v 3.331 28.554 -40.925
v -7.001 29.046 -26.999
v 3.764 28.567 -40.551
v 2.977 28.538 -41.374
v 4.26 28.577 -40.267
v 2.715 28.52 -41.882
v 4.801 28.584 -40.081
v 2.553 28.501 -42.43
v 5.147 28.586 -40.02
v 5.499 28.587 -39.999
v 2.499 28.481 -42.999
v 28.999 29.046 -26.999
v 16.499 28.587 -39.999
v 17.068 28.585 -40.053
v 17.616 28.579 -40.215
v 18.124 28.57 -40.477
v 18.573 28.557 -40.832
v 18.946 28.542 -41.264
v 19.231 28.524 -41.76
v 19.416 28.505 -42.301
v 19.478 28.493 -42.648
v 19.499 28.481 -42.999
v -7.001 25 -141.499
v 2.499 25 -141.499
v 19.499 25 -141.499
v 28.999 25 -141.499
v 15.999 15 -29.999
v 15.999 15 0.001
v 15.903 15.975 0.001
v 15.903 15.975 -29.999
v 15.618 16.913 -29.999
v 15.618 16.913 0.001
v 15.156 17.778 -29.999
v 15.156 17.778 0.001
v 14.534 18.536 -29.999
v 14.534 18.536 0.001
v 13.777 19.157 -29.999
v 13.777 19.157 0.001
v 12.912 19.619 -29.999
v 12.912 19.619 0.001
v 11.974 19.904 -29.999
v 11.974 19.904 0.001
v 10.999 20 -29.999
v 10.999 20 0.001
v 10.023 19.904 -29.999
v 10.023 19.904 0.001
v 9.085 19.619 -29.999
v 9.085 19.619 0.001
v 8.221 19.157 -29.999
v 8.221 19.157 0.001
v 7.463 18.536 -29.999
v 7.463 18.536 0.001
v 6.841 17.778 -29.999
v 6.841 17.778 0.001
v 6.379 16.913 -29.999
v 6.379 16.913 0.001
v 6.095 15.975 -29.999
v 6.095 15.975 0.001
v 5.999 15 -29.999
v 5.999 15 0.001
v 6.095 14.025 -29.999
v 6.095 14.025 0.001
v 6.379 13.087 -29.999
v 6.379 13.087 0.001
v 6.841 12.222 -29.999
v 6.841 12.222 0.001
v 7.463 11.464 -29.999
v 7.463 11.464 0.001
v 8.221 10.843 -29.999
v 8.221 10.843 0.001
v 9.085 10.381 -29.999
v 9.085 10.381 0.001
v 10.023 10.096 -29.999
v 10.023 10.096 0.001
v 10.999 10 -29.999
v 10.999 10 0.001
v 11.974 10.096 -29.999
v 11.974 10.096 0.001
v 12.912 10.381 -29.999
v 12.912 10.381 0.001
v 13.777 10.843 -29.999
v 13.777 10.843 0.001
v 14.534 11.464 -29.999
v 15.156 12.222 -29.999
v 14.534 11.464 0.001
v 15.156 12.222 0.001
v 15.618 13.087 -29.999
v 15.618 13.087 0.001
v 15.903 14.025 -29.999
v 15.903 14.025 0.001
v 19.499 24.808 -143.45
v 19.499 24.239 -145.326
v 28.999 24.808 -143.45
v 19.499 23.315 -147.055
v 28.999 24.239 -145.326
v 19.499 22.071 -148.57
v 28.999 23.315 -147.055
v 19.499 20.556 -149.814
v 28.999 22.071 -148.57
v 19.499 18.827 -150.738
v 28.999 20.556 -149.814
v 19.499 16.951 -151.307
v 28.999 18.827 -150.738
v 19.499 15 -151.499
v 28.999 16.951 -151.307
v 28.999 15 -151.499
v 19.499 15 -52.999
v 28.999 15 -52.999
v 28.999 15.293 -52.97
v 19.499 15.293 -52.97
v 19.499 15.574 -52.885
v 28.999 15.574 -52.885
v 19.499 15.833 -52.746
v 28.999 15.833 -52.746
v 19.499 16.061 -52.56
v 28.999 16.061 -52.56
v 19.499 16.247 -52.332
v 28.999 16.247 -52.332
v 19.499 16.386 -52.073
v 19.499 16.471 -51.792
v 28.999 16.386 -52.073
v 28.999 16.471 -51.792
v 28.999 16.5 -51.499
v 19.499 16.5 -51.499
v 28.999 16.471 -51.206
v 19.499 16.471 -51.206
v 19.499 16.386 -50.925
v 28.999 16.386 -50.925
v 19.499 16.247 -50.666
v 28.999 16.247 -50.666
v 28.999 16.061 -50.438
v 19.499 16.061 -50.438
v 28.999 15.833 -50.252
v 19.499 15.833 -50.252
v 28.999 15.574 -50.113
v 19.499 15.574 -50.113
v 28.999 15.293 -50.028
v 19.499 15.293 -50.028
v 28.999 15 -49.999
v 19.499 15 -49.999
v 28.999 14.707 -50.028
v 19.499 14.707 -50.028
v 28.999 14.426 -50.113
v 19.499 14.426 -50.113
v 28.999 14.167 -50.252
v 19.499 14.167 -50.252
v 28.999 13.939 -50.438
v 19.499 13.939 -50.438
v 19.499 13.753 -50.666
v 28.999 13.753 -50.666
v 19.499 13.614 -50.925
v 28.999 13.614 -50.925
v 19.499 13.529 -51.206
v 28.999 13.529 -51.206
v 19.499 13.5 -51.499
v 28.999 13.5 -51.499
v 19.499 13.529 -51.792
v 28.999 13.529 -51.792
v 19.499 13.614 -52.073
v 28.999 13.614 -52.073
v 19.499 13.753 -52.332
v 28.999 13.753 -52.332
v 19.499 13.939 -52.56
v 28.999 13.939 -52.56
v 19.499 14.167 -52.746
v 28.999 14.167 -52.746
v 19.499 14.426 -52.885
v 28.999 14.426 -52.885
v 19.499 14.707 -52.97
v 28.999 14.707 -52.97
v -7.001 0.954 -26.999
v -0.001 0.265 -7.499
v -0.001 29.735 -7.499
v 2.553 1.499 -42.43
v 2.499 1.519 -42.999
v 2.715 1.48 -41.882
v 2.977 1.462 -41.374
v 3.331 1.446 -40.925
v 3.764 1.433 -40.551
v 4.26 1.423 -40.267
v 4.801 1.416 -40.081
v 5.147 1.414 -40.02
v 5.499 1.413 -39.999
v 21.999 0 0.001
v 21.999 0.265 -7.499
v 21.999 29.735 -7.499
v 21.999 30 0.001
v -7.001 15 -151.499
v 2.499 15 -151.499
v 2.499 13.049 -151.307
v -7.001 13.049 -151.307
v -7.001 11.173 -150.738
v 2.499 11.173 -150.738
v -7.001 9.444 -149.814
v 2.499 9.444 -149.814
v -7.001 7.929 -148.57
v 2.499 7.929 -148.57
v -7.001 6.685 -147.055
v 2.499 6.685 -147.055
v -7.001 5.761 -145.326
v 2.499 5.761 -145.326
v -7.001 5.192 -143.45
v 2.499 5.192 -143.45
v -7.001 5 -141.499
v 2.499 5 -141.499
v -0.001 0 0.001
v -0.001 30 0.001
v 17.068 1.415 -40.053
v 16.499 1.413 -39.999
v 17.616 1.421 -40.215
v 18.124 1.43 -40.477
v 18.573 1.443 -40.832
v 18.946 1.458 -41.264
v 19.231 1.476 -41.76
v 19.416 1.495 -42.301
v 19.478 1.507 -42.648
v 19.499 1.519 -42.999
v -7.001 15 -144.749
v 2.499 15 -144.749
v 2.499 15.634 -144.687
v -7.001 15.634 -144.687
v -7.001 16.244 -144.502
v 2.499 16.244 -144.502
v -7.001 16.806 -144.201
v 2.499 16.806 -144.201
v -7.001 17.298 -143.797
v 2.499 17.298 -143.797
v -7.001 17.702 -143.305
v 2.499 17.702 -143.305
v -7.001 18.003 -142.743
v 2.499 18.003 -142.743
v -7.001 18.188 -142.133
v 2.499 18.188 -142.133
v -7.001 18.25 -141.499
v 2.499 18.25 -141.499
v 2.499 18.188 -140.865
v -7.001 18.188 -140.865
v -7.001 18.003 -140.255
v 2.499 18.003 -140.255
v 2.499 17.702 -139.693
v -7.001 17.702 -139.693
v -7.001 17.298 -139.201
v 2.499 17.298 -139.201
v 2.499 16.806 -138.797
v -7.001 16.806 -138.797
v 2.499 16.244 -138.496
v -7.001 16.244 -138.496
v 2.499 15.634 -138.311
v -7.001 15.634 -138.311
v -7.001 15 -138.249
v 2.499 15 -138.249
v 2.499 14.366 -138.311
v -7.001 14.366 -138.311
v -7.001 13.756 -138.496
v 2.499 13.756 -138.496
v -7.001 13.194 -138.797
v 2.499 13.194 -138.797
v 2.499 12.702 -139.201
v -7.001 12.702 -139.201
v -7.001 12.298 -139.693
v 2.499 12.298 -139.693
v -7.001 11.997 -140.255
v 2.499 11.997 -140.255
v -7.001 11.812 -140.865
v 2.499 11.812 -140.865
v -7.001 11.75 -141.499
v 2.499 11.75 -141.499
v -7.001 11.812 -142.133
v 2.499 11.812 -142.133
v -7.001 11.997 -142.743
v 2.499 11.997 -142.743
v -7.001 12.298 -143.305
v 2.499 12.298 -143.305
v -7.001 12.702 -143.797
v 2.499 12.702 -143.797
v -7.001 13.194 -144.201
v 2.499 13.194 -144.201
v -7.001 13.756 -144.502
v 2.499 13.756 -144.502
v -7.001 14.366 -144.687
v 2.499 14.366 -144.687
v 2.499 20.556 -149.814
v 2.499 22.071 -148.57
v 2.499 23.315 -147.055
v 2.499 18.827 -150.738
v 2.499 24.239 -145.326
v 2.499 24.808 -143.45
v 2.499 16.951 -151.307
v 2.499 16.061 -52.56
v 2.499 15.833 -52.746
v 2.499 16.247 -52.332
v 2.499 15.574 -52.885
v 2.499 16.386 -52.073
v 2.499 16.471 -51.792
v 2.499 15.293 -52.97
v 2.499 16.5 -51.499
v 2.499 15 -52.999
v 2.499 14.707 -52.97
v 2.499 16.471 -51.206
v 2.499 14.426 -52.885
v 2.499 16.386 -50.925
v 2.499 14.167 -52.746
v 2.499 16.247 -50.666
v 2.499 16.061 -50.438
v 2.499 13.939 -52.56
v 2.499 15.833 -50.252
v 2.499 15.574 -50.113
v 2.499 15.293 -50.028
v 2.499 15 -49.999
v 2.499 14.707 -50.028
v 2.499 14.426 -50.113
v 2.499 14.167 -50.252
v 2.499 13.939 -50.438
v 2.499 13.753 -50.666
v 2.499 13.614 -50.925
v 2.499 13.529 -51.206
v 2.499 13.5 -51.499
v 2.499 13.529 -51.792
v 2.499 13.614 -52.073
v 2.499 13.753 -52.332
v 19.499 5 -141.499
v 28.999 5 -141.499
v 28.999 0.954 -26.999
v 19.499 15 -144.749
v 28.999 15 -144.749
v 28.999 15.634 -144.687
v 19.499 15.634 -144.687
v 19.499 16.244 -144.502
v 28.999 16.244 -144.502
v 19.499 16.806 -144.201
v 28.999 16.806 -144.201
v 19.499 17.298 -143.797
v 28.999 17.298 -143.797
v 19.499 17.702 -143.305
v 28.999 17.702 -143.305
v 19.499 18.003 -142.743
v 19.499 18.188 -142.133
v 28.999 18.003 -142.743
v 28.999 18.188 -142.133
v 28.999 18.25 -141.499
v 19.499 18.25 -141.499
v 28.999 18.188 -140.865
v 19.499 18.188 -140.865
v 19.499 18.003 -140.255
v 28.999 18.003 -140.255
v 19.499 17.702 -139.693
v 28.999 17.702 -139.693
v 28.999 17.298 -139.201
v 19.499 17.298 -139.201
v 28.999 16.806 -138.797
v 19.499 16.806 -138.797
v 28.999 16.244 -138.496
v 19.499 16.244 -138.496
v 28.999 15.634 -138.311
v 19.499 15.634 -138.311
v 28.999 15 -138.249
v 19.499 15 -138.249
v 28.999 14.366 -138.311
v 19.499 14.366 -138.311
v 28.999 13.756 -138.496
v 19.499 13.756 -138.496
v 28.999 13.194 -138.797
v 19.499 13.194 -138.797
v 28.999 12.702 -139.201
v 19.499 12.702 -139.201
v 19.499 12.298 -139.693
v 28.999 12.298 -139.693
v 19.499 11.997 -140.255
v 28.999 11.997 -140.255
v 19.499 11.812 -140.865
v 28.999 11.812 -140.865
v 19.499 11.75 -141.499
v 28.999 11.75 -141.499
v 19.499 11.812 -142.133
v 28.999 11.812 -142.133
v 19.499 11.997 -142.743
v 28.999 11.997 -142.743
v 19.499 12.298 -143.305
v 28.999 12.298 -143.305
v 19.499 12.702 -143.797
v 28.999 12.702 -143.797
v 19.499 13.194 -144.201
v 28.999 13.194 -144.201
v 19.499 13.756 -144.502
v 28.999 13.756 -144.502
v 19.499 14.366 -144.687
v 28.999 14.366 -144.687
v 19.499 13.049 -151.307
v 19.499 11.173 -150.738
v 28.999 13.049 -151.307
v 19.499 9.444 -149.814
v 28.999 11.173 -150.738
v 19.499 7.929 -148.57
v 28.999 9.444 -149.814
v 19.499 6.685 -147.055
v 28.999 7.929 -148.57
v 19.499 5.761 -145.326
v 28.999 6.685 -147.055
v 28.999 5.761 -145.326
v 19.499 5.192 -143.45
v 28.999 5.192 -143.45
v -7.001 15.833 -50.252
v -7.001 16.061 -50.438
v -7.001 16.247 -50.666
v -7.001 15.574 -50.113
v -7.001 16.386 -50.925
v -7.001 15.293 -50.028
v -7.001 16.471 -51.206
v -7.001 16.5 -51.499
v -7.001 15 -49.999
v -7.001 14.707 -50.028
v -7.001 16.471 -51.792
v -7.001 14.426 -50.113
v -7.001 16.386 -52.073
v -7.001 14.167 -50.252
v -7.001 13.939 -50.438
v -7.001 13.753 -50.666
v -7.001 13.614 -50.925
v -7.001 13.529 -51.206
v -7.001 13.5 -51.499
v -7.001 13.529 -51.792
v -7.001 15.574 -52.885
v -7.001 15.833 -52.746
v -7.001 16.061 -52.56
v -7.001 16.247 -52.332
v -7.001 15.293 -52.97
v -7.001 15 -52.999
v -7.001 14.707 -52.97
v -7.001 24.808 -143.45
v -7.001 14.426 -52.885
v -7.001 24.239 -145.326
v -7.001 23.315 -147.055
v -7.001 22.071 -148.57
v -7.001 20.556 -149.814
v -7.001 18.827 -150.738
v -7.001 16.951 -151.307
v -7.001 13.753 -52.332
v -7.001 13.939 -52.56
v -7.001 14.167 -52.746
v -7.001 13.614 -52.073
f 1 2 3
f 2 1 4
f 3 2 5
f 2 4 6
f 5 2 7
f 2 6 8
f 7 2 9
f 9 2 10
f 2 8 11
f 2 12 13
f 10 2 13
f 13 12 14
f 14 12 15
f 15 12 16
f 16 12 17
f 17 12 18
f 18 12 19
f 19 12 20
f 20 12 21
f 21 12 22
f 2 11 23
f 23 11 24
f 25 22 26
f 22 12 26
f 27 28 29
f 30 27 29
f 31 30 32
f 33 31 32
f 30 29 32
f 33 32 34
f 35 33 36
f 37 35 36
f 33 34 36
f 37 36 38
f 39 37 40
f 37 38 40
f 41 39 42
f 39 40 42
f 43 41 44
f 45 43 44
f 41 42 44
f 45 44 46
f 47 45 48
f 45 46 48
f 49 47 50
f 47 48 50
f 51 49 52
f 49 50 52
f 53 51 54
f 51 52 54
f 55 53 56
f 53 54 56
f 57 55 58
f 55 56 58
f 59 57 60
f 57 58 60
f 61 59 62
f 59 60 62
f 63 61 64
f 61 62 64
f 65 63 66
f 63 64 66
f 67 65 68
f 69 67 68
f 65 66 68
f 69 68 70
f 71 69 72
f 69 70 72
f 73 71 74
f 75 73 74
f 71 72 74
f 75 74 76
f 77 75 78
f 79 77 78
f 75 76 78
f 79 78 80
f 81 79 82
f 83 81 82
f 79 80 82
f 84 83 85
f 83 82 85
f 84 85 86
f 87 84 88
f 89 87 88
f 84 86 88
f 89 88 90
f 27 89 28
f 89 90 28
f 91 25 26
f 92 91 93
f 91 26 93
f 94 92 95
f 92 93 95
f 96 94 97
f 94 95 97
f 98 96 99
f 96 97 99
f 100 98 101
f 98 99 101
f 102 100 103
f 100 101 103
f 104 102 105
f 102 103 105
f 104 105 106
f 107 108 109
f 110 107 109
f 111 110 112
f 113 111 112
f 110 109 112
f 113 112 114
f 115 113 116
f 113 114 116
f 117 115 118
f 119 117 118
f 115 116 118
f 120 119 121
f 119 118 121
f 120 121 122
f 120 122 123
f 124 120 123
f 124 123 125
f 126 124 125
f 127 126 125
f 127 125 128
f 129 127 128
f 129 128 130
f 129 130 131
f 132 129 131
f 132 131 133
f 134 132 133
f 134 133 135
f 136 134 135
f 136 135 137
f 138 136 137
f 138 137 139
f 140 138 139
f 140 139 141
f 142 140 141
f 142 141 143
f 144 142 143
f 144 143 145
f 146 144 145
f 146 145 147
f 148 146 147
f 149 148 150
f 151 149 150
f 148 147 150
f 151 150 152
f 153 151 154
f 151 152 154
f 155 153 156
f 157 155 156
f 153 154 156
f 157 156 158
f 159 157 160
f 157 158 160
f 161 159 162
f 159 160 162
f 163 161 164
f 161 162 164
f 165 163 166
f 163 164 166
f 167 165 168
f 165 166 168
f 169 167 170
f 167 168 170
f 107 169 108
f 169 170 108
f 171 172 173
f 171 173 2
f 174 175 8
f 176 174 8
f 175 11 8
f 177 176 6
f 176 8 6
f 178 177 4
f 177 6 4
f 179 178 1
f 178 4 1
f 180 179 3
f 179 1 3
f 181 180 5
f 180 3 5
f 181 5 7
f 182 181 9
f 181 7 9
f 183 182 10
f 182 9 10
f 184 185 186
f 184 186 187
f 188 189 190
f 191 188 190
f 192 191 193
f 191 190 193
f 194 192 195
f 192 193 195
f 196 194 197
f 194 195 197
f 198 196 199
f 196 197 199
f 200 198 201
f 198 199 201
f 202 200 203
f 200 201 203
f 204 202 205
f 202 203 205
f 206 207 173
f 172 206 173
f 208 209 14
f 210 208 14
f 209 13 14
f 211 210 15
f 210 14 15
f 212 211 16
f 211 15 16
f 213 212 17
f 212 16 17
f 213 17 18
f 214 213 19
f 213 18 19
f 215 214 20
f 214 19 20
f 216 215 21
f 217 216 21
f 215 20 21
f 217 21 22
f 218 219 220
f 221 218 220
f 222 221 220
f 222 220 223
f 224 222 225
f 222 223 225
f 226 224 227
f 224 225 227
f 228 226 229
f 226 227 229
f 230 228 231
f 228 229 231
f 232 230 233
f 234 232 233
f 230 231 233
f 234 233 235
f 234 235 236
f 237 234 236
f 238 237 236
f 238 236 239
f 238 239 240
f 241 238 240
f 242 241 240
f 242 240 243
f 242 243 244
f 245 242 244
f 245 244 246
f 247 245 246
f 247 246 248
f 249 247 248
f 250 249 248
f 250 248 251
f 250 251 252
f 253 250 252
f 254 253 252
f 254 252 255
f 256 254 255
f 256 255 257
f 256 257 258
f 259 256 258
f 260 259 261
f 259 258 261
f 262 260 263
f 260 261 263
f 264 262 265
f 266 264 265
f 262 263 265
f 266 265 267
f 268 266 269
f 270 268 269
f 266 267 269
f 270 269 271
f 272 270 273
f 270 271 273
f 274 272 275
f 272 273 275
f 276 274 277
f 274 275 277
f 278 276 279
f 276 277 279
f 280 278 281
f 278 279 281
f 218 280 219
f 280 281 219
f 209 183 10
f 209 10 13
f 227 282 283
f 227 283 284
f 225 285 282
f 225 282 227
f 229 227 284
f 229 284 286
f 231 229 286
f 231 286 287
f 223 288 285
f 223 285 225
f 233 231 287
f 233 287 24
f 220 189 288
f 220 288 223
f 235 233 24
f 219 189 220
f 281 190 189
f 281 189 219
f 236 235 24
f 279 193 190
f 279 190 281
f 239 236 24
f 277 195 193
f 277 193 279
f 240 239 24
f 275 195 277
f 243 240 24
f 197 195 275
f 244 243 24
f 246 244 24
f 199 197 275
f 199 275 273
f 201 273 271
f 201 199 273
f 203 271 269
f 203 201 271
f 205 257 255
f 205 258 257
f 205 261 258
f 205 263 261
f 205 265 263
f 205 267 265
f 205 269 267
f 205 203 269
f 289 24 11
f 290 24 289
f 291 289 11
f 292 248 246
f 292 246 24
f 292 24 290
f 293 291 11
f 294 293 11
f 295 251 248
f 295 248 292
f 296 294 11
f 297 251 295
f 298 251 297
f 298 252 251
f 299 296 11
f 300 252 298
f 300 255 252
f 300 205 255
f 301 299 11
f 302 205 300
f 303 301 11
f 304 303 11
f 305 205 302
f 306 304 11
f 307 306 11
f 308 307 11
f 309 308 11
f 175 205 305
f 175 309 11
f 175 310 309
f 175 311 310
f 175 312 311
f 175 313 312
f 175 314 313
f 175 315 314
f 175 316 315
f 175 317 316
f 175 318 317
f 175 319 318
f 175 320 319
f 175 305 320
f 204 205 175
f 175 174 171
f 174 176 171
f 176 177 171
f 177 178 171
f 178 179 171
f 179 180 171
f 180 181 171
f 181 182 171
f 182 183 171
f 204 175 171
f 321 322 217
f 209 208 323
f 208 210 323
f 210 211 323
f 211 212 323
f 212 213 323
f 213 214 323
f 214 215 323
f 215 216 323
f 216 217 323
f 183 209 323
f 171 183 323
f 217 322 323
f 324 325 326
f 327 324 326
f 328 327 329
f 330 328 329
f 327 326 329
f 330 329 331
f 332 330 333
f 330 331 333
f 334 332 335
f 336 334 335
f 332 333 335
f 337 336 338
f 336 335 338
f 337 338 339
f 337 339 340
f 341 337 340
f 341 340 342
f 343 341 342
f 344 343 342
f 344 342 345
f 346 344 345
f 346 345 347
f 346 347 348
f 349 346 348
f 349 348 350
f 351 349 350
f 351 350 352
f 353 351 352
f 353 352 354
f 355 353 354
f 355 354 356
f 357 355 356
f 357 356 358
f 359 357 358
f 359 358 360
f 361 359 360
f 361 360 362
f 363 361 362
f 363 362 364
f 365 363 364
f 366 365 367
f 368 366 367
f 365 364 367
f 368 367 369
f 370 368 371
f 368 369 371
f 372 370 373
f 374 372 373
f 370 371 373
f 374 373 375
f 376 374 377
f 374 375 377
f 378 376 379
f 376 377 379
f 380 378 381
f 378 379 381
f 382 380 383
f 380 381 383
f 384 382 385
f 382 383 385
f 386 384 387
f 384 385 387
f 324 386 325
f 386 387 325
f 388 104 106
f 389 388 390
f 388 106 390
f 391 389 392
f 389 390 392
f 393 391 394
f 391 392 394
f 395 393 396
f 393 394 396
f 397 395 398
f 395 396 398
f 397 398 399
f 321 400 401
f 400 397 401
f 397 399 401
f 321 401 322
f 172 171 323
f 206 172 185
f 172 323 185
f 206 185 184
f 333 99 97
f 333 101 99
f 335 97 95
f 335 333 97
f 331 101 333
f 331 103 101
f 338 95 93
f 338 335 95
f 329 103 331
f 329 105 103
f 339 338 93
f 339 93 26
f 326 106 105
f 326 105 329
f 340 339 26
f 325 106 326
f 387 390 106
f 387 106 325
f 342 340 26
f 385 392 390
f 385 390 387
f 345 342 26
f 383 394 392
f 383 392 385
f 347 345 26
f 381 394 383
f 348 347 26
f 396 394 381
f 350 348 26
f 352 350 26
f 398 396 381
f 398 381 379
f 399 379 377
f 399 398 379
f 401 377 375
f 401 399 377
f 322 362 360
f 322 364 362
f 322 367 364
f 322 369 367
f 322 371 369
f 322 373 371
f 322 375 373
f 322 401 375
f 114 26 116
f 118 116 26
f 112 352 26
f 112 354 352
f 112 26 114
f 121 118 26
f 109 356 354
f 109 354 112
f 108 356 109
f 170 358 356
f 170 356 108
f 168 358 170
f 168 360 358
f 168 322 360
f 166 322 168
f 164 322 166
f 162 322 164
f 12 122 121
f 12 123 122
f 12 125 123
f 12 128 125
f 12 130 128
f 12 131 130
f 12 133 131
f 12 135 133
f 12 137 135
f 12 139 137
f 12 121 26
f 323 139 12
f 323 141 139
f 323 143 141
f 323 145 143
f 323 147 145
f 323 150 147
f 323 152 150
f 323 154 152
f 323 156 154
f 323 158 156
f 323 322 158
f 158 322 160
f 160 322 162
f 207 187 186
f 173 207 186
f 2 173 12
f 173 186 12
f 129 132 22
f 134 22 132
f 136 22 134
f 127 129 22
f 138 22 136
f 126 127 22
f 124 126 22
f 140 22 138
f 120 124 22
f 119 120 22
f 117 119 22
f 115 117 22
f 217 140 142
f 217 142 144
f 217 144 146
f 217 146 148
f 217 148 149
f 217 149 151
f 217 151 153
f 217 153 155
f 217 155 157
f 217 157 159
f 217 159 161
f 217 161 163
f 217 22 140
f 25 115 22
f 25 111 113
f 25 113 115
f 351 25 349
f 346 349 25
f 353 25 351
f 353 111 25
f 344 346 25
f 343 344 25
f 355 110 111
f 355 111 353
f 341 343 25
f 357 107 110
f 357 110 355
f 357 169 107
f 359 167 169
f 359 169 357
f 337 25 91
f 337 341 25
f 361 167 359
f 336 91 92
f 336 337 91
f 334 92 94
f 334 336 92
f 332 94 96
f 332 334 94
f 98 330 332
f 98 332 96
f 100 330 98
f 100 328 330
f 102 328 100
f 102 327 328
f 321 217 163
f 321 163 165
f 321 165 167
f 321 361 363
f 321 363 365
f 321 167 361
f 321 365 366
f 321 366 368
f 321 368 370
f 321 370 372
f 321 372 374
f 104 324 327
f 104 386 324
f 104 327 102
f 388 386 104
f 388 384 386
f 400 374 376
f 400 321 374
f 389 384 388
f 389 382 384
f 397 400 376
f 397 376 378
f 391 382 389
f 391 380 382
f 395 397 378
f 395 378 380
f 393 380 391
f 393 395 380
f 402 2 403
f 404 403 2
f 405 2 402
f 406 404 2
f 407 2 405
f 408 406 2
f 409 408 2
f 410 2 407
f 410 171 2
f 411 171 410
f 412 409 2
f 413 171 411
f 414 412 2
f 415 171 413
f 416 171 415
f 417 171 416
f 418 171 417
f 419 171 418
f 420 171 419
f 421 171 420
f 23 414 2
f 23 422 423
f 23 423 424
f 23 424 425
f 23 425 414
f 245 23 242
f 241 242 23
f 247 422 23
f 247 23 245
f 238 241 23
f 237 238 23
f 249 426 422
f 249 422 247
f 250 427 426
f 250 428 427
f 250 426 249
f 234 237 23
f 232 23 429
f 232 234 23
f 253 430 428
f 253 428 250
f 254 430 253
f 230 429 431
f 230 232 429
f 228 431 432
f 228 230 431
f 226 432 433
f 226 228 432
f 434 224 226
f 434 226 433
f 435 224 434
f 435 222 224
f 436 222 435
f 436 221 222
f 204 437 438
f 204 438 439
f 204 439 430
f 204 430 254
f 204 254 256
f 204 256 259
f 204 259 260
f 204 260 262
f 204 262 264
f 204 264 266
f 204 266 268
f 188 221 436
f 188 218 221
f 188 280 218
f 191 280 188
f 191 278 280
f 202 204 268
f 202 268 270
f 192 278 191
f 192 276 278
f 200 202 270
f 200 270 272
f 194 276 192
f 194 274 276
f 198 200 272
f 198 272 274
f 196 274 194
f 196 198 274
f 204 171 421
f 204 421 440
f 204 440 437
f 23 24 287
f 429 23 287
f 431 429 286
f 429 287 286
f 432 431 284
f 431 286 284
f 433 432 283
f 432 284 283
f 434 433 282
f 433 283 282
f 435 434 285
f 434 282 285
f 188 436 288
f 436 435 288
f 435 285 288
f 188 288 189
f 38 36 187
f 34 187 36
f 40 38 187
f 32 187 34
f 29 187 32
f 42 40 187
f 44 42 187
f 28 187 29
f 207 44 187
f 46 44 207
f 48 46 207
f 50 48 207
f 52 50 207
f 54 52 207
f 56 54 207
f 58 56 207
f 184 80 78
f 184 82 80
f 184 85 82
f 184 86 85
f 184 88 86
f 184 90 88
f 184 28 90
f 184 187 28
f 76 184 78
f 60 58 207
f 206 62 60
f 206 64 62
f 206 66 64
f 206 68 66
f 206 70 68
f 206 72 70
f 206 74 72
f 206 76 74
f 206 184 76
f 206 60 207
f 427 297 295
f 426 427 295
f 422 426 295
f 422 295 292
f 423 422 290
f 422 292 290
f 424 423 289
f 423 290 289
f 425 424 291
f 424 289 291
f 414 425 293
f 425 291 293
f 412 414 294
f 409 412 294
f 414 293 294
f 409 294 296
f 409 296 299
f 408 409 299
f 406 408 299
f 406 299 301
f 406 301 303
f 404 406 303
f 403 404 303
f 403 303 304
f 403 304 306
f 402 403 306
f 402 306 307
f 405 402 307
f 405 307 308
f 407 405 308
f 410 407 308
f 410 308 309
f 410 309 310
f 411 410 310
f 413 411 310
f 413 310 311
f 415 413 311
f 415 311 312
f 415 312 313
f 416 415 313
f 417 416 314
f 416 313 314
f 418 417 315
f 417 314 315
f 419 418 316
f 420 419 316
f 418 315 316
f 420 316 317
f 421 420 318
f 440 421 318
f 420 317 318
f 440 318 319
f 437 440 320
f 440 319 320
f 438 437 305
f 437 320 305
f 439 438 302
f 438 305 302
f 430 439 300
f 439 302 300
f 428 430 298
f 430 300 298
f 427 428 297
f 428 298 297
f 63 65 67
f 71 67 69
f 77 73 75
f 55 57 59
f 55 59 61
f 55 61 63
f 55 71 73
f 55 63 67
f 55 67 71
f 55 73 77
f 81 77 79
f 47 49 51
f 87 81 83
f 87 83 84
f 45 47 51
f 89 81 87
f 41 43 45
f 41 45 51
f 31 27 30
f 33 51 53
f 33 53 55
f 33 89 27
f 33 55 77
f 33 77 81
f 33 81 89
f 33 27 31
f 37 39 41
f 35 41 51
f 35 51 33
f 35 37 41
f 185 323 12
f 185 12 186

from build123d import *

# Parameters (mm, degrees)
BOSS_EXTRUDE1_DEPTH = 30
SKETCH3_R           = 1.5
SKETCH3_R_2         = 3.25
CUT_EXTRUDE2_DEPTH  = 100
FILLET1_R           = 3
SKETCH6_R           = 5
CUT_EXTRUDE3_DEPTH  = 30


with BuildPart() as part:
    # Sketch1 → Boss-Extrude1 (new body)
    with BuildSketch(Plane(origin=(0, 0, 0), x_dir=(1, 0, 0), z_dir=(0, 1, 0))):
        Polygon((-7.001251561, 151.499010634), (2.498748439, 151.499010634), (2.498748439, 39.999010634), (19.498748439, 39.999010634), (19.498748439, 151.499010634), (28.998748439, 151.499010634), (28.998748439, 26.999010634), (21.998748439, 7.499010634), (21.998748439, -0.000989366), (-0.001251561, -0.000989366), (-0.001251561, 7.499010634), (-7.001251561, 26.999010634), align=None)
    extrude(amount=BOSS_EXTRUDE1_DEPTH)

    # Sketch3 → Cut-Extrude2 (cut)
    with BuildSketch(Plane(origin=(28.998748439, 0, 0), x_dir=(0, 0, -1), z_dir=(1, 0, 0))):
        with BuildLine():
            Line((26.999010634, 30), (26.999010634, 29.045936396))
            Line((26.999010634, 29.045936396), (141.499010634, 25))
            ThreePointArc((141.499010634, 25), (148.570078446, 22.071067812), (151.499010634, 15))
            Line((151.499010634, 15), (151.499010634, 30))
            Line((151.499010634, 30), (26.999010634, 30))
        make_face()
        with BuildLine():
            Line((141.499010634, 5), (26.999010634, 0.954063604))
            Line((26.999010634, 0.954063604), (26.999010634, 0))
            Line((26.999010634, 0), (151.499010634, 0))
            Line((151.499010634, 0), (151.499010634, 15))
            ThreePointArc((151.499010634, 15), (148.570078446, 7.928932188), (141.499010634, 5))
        make_face()
        Polygon((26.999010634, 30), (-0.000989366, 30), (26.999010634, 29.045936396), align=None)
        Polygon((26.999010634, 0.954063604), (-0.000989366, 0), (26.999010634, 0), align=None)
        with Locations((51.499010634, 15)):
            Circle(SKETCH3_R)
        with Locations((141.499010634, 15)):
            Circle(SKETCH3_R_2)
    extrude(amount=-CUT_EXTRUDE2_DEPTH, mode=Mode.SUBTRACT)

    # Fillet1
    fillet1_edges = [part.edges().sort_by_distance(p)[0] for p in [
        (2.498748439, 15, -39.999010634),
        (19.498748439, 15, -39.999010634),
    ]]
    fillet(fillet1_edges, radius=FILLET1_R)

    # Sketch6 → Cut-Extrude3 (cut)
    with BuildSketch(Plane.XY.offset(0.000989366)):
        with Locations((10.998748439, 15)):
            Circle(SKETCH6_R)
    extrude(amount=-CUT_EXTRUDE3_DEPTH, mode=Mode.SUBTRACT)


solid = part.part
